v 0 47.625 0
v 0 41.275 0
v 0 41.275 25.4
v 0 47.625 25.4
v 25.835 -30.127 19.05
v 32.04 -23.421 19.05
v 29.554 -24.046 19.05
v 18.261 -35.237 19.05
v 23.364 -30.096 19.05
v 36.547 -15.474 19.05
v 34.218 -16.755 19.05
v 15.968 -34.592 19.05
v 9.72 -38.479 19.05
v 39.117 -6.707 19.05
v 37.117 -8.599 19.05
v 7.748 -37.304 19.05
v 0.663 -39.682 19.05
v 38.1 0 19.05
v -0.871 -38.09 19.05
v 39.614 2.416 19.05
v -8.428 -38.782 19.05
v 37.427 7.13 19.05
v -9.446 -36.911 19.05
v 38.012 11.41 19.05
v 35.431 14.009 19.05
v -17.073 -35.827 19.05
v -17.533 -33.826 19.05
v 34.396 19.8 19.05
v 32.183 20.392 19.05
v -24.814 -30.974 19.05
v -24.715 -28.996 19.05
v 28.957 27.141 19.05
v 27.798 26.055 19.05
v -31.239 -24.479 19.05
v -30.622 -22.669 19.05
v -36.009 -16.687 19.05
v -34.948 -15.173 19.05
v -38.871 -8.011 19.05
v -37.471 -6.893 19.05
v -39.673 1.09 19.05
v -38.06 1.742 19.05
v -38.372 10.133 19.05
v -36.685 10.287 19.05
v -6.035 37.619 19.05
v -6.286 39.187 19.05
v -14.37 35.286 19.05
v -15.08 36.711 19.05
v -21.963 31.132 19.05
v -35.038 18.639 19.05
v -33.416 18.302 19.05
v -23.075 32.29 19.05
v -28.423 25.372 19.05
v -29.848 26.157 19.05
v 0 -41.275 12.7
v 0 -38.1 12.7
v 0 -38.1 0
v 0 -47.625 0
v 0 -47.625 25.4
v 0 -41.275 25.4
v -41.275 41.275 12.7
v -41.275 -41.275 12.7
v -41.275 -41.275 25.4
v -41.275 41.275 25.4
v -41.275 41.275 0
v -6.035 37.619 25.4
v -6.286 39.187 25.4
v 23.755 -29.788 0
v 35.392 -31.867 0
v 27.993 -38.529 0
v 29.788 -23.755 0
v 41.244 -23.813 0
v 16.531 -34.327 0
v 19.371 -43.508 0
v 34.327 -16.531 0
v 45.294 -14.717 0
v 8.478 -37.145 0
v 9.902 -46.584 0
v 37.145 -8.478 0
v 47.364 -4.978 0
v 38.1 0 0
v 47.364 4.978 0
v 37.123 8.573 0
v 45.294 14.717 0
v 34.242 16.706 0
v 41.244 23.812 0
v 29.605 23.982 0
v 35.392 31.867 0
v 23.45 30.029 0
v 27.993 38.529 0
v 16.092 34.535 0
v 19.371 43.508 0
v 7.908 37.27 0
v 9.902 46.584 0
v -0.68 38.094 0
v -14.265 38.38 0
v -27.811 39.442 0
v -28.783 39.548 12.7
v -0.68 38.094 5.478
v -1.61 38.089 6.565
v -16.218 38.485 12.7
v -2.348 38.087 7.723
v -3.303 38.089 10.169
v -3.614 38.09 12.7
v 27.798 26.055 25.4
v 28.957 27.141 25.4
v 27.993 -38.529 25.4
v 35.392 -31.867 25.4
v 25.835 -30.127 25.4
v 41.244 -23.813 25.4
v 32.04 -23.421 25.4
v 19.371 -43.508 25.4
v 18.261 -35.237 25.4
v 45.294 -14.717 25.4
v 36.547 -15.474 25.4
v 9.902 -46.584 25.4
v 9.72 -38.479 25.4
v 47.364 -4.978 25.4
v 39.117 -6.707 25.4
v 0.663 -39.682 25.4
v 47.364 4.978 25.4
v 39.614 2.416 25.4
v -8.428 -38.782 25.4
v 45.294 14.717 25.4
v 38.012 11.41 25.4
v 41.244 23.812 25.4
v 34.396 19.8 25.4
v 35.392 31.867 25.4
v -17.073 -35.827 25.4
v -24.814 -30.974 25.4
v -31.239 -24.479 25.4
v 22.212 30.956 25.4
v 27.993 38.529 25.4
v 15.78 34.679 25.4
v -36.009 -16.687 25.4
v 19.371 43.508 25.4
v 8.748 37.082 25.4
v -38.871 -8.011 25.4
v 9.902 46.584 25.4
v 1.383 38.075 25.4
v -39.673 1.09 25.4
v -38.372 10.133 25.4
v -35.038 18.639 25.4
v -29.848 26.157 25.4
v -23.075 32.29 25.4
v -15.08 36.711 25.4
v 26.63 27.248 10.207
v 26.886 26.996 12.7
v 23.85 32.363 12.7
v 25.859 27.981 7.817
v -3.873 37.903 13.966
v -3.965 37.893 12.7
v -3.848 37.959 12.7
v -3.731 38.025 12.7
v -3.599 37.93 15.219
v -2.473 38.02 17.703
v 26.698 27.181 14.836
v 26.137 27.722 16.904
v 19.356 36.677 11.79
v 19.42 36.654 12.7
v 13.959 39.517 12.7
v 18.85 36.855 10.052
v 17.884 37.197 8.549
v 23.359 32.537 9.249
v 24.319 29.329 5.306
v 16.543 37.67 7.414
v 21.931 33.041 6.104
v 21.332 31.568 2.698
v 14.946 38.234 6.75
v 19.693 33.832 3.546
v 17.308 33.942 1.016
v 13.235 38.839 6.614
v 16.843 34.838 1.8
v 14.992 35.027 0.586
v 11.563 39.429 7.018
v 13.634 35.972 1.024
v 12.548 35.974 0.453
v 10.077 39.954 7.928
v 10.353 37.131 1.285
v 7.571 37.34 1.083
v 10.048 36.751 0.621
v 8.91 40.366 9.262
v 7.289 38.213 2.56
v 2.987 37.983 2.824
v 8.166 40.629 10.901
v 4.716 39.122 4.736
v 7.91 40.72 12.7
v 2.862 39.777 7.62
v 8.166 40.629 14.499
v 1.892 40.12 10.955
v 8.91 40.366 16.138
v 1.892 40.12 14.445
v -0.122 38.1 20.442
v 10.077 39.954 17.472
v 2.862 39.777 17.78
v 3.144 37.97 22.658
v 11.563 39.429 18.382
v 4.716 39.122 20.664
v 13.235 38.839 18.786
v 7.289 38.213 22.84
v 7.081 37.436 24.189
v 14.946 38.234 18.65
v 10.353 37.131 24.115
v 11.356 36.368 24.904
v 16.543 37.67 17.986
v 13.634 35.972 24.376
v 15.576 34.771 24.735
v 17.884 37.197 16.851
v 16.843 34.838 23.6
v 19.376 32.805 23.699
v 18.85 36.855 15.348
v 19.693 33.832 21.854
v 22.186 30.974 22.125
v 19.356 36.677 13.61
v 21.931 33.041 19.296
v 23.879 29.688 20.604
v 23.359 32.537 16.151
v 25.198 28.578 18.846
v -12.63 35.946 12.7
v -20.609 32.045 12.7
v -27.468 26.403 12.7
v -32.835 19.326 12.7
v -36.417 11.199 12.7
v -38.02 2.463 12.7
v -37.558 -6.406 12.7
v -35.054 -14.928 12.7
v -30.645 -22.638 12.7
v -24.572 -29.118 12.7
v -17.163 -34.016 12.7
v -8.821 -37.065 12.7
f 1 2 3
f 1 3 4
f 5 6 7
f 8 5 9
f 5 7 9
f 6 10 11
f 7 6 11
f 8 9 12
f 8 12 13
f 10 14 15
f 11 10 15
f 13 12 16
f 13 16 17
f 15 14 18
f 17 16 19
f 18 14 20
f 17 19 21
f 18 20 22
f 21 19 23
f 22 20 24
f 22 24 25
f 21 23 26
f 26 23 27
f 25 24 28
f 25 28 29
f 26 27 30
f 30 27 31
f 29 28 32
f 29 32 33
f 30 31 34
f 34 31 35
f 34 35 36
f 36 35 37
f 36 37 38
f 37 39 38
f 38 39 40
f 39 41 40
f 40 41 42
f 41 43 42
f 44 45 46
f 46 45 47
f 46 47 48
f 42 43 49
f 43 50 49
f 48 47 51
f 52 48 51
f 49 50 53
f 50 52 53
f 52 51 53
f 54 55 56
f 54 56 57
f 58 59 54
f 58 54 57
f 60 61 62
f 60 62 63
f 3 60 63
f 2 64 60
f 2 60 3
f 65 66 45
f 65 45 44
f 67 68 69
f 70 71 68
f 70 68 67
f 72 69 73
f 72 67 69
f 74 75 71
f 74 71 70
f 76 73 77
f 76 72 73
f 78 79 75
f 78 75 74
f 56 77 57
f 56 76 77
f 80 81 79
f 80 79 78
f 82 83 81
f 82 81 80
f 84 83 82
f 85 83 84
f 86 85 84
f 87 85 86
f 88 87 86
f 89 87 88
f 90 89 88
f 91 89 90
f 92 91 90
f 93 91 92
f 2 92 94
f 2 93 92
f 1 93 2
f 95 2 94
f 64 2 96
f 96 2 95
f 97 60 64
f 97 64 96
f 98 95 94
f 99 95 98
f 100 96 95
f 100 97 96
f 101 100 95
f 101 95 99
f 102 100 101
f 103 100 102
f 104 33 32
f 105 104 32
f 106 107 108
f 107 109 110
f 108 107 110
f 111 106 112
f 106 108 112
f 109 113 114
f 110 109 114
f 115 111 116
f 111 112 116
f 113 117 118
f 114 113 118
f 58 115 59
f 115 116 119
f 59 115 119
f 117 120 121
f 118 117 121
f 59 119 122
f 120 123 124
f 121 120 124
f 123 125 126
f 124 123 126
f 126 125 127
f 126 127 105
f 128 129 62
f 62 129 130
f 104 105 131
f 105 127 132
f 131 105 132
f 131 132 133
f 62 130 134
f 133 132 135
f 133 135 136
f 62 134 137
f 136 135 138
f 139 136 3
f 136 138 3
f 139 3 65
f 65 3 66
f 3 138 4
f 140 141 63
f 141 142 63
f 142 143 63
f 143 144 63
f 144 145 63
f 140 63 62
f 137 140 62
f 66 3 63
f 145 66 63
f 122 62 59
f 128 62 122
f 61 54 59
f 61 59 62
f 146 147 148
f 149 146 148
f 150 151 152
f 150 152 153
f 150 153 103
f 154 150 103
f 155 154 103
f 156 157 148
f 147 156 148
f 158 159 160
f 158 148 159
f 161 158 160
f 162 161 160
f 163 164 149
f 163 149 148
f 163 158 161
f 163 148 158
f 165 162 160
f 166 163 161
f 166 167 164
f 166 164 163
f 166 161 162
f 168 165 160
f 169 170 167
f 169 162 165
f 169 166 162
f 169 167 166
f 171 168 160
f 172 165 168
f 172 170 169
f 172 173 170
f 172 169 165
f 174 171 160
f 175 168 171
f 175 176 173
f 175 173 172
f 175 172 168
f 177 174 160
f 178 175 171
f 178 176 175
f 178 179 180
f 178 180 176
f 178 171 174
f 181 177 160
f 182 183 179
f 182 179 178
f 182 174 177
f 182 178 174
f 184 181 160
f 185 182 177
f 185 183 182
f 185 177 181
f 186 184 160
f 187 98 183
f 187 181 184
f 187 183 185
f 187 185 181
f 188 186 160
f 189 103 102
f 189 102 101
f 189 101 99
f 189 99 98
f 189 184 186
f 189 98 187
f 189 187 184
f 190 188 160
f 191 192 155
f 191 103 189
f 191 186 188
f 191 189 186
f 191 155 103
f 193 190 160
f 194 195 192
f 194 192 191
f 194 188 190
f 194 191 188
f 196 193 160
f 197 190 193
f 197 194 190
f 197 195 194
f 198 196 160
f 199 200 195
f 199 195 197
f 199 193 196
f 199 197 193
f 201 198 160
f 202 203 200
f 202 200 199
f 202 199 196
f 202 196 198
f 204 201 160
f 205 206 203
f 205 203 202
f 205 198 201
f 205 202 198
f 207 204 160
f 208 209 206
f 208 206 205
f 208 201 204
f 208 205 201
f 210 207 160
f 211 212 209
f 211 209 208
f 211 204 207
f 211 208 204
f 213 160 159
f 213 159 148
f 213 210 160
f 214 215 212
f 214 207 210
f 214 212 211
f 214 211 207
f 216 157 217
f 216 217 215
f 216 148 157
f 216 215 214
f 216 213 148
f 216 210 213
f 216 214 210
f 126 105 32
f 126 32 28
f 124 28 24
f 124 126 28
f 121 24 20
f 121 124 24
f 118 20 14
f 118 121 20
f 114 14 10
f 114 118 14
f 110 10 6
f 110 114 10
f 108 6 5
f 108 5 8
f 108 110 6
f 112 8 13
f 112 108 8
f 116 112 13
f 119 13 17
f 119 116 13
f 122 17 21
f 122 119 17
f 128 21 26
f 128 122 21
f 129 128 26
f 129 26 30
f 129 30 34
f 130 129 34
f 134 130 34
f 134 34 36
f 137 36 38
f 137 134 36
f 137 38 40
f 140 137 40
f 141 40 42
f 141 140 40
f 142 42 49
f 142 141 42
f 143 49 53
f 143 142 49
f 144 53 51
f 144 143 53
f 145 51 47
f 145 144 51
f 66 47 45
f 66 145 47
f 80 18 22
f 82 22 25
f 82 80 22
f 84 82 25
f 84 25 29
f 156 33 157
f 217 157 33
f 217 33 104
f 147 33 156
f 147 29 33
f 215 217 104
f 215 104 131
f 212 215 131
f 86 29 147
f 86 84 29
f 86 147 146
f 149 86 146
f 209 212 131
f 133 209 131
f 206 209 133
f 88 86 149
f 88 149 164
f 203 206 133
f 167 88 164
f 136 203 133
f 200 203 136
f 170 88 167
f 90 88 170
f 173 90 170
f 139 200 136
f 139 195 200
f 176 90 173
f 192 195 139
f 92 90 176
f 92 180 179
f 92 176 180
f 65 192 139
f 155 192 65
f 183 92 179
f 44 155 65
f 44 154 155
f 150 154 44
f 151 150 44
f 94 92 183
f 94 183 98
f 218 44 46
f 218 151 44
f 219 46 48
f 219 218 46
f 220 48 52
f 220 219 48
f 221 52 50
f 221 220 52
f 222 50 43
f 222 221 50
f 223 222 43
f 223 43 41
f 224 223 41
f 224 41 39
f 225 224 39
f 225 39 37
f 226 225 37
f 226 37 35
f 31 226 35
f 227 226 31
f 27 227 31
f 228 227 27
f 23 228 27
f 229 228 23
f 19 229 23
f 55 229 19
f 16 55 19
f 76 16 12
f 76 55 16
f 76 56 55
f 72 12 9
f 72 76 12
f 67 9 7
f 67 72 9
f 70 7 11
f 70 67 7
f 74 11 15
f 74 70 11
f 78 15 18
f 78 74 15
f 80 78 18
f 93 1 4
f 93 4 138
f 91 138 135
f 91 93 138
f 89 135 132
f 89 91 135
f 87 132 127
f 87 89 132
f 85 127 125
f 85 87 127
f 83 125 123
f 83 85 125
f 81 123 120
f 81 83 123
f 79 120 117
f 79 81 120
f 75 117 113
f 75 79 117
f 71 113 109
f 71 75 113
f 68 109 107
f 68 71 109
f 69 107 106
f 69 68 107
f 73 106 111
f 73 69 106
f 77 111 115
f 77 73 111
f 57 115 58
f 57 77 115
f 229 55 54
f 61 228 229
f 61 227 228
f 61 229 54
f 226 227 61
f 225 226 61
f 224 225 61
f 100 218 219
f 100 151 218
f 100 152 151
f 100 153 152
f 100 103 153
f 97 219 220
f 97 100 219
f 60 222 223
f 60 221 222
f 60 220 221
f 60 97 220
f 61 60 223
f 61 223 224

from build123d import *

# Parameters (mm, degrees)
SKETCH1_R           = 38.1
BOSS_EXTRUDE1_DEPTH = 25.4
CUT_EXTRUDE1_DEPTH  = 6.35
CUT_EXTRUDE2_START  = -12.7
CUT_EXTRUDE2_DEPTH  = 12.7


with BuildPart() as part:
    # Sketch1 → Boss-Extrude1 (new body)
    with BuildSketch(Plane.XY):
        with BuildLine():
            Line((-41.275, -41.275), (-41.275, 41.275))
            Line((-41.275, 41.275), (0, 41.275))
            Line((0, 41.275), (0, 47.625))
            ThreePointArc((0, 47.625), (47.625, 0), (0, -47.625))
            Line((0, -47.625), (0, -41.275))
            Line((0, -41.275), (-41.275, -41.275))
        make_face()
        Circle(SKETCH1_R, mode=Mode.SUBTRACT)
    extrude(amount=BOSS_EXTRUDE1_DEPTH)

    # Sketch5 → Cut-Revolve3 (revolve, cut)
    with BuildSketch(Plane(origin=(0, 0, 12.7), x_dir=(-1, 0, 0), z_dir=(0, 0, -1))):
        with BuildLine():
            Line((0.422989948, -1.197488832), (-13.958668291, 39.517131469))
            ThreePointArc((-13.958668291, 39.517131469), (-27.125149322, 11.968992199), (0.422989948, -1.197488832))
        make_face()
    revolve(axis=Axis((-0.422989948, -1.197488832, 12.7), (0.333062951, 0.942904592, 0)), mode=Mode.SUBTRACT)

    # Sketch2 → Cut-Extrude1 (cut)
    with BuildSketch(Plane.XY.offset(25.4)):
        with BuildLine():
            Line((-6.286105585, 39.186509577), (0, 0))
            Line((0, 0), (28.956627522, 27.140585455))
            ThreePointArc((28.956627522, 27.140585455), (-12.836051309, -37.55440644), (-6.286105585, 39.186509577))
        make_face()
    extrude(amount=-CUT_EXTRUDE1_DEPTH, mode=Mode.SUBTRACT)

    # Sketch4 → Cut-Extrude2 (cut)
    with BuildSketch(Plane(origin=(0, 0, 0), x_dir=(-1, 0, 0), z_dir=(0, 0, -1)).offset(CUT_EXTRUDE2_START)):
        with BuildLine():
            Line((0, 38.1), (0, -41.275))
            Line((0, -41.275), (41.275, -41.275))
            Line((41.275, -41.275), (41.275, 41.275))
            ThreePointArc((41.275, 41.275), (20.706704521, 38.787841223), (0, 38.1))
        make_face()
    extrude(amount=CUT_EXTRUDE2_DEPTH, mode=Mode.SUBTRACT)


solid = part.part
